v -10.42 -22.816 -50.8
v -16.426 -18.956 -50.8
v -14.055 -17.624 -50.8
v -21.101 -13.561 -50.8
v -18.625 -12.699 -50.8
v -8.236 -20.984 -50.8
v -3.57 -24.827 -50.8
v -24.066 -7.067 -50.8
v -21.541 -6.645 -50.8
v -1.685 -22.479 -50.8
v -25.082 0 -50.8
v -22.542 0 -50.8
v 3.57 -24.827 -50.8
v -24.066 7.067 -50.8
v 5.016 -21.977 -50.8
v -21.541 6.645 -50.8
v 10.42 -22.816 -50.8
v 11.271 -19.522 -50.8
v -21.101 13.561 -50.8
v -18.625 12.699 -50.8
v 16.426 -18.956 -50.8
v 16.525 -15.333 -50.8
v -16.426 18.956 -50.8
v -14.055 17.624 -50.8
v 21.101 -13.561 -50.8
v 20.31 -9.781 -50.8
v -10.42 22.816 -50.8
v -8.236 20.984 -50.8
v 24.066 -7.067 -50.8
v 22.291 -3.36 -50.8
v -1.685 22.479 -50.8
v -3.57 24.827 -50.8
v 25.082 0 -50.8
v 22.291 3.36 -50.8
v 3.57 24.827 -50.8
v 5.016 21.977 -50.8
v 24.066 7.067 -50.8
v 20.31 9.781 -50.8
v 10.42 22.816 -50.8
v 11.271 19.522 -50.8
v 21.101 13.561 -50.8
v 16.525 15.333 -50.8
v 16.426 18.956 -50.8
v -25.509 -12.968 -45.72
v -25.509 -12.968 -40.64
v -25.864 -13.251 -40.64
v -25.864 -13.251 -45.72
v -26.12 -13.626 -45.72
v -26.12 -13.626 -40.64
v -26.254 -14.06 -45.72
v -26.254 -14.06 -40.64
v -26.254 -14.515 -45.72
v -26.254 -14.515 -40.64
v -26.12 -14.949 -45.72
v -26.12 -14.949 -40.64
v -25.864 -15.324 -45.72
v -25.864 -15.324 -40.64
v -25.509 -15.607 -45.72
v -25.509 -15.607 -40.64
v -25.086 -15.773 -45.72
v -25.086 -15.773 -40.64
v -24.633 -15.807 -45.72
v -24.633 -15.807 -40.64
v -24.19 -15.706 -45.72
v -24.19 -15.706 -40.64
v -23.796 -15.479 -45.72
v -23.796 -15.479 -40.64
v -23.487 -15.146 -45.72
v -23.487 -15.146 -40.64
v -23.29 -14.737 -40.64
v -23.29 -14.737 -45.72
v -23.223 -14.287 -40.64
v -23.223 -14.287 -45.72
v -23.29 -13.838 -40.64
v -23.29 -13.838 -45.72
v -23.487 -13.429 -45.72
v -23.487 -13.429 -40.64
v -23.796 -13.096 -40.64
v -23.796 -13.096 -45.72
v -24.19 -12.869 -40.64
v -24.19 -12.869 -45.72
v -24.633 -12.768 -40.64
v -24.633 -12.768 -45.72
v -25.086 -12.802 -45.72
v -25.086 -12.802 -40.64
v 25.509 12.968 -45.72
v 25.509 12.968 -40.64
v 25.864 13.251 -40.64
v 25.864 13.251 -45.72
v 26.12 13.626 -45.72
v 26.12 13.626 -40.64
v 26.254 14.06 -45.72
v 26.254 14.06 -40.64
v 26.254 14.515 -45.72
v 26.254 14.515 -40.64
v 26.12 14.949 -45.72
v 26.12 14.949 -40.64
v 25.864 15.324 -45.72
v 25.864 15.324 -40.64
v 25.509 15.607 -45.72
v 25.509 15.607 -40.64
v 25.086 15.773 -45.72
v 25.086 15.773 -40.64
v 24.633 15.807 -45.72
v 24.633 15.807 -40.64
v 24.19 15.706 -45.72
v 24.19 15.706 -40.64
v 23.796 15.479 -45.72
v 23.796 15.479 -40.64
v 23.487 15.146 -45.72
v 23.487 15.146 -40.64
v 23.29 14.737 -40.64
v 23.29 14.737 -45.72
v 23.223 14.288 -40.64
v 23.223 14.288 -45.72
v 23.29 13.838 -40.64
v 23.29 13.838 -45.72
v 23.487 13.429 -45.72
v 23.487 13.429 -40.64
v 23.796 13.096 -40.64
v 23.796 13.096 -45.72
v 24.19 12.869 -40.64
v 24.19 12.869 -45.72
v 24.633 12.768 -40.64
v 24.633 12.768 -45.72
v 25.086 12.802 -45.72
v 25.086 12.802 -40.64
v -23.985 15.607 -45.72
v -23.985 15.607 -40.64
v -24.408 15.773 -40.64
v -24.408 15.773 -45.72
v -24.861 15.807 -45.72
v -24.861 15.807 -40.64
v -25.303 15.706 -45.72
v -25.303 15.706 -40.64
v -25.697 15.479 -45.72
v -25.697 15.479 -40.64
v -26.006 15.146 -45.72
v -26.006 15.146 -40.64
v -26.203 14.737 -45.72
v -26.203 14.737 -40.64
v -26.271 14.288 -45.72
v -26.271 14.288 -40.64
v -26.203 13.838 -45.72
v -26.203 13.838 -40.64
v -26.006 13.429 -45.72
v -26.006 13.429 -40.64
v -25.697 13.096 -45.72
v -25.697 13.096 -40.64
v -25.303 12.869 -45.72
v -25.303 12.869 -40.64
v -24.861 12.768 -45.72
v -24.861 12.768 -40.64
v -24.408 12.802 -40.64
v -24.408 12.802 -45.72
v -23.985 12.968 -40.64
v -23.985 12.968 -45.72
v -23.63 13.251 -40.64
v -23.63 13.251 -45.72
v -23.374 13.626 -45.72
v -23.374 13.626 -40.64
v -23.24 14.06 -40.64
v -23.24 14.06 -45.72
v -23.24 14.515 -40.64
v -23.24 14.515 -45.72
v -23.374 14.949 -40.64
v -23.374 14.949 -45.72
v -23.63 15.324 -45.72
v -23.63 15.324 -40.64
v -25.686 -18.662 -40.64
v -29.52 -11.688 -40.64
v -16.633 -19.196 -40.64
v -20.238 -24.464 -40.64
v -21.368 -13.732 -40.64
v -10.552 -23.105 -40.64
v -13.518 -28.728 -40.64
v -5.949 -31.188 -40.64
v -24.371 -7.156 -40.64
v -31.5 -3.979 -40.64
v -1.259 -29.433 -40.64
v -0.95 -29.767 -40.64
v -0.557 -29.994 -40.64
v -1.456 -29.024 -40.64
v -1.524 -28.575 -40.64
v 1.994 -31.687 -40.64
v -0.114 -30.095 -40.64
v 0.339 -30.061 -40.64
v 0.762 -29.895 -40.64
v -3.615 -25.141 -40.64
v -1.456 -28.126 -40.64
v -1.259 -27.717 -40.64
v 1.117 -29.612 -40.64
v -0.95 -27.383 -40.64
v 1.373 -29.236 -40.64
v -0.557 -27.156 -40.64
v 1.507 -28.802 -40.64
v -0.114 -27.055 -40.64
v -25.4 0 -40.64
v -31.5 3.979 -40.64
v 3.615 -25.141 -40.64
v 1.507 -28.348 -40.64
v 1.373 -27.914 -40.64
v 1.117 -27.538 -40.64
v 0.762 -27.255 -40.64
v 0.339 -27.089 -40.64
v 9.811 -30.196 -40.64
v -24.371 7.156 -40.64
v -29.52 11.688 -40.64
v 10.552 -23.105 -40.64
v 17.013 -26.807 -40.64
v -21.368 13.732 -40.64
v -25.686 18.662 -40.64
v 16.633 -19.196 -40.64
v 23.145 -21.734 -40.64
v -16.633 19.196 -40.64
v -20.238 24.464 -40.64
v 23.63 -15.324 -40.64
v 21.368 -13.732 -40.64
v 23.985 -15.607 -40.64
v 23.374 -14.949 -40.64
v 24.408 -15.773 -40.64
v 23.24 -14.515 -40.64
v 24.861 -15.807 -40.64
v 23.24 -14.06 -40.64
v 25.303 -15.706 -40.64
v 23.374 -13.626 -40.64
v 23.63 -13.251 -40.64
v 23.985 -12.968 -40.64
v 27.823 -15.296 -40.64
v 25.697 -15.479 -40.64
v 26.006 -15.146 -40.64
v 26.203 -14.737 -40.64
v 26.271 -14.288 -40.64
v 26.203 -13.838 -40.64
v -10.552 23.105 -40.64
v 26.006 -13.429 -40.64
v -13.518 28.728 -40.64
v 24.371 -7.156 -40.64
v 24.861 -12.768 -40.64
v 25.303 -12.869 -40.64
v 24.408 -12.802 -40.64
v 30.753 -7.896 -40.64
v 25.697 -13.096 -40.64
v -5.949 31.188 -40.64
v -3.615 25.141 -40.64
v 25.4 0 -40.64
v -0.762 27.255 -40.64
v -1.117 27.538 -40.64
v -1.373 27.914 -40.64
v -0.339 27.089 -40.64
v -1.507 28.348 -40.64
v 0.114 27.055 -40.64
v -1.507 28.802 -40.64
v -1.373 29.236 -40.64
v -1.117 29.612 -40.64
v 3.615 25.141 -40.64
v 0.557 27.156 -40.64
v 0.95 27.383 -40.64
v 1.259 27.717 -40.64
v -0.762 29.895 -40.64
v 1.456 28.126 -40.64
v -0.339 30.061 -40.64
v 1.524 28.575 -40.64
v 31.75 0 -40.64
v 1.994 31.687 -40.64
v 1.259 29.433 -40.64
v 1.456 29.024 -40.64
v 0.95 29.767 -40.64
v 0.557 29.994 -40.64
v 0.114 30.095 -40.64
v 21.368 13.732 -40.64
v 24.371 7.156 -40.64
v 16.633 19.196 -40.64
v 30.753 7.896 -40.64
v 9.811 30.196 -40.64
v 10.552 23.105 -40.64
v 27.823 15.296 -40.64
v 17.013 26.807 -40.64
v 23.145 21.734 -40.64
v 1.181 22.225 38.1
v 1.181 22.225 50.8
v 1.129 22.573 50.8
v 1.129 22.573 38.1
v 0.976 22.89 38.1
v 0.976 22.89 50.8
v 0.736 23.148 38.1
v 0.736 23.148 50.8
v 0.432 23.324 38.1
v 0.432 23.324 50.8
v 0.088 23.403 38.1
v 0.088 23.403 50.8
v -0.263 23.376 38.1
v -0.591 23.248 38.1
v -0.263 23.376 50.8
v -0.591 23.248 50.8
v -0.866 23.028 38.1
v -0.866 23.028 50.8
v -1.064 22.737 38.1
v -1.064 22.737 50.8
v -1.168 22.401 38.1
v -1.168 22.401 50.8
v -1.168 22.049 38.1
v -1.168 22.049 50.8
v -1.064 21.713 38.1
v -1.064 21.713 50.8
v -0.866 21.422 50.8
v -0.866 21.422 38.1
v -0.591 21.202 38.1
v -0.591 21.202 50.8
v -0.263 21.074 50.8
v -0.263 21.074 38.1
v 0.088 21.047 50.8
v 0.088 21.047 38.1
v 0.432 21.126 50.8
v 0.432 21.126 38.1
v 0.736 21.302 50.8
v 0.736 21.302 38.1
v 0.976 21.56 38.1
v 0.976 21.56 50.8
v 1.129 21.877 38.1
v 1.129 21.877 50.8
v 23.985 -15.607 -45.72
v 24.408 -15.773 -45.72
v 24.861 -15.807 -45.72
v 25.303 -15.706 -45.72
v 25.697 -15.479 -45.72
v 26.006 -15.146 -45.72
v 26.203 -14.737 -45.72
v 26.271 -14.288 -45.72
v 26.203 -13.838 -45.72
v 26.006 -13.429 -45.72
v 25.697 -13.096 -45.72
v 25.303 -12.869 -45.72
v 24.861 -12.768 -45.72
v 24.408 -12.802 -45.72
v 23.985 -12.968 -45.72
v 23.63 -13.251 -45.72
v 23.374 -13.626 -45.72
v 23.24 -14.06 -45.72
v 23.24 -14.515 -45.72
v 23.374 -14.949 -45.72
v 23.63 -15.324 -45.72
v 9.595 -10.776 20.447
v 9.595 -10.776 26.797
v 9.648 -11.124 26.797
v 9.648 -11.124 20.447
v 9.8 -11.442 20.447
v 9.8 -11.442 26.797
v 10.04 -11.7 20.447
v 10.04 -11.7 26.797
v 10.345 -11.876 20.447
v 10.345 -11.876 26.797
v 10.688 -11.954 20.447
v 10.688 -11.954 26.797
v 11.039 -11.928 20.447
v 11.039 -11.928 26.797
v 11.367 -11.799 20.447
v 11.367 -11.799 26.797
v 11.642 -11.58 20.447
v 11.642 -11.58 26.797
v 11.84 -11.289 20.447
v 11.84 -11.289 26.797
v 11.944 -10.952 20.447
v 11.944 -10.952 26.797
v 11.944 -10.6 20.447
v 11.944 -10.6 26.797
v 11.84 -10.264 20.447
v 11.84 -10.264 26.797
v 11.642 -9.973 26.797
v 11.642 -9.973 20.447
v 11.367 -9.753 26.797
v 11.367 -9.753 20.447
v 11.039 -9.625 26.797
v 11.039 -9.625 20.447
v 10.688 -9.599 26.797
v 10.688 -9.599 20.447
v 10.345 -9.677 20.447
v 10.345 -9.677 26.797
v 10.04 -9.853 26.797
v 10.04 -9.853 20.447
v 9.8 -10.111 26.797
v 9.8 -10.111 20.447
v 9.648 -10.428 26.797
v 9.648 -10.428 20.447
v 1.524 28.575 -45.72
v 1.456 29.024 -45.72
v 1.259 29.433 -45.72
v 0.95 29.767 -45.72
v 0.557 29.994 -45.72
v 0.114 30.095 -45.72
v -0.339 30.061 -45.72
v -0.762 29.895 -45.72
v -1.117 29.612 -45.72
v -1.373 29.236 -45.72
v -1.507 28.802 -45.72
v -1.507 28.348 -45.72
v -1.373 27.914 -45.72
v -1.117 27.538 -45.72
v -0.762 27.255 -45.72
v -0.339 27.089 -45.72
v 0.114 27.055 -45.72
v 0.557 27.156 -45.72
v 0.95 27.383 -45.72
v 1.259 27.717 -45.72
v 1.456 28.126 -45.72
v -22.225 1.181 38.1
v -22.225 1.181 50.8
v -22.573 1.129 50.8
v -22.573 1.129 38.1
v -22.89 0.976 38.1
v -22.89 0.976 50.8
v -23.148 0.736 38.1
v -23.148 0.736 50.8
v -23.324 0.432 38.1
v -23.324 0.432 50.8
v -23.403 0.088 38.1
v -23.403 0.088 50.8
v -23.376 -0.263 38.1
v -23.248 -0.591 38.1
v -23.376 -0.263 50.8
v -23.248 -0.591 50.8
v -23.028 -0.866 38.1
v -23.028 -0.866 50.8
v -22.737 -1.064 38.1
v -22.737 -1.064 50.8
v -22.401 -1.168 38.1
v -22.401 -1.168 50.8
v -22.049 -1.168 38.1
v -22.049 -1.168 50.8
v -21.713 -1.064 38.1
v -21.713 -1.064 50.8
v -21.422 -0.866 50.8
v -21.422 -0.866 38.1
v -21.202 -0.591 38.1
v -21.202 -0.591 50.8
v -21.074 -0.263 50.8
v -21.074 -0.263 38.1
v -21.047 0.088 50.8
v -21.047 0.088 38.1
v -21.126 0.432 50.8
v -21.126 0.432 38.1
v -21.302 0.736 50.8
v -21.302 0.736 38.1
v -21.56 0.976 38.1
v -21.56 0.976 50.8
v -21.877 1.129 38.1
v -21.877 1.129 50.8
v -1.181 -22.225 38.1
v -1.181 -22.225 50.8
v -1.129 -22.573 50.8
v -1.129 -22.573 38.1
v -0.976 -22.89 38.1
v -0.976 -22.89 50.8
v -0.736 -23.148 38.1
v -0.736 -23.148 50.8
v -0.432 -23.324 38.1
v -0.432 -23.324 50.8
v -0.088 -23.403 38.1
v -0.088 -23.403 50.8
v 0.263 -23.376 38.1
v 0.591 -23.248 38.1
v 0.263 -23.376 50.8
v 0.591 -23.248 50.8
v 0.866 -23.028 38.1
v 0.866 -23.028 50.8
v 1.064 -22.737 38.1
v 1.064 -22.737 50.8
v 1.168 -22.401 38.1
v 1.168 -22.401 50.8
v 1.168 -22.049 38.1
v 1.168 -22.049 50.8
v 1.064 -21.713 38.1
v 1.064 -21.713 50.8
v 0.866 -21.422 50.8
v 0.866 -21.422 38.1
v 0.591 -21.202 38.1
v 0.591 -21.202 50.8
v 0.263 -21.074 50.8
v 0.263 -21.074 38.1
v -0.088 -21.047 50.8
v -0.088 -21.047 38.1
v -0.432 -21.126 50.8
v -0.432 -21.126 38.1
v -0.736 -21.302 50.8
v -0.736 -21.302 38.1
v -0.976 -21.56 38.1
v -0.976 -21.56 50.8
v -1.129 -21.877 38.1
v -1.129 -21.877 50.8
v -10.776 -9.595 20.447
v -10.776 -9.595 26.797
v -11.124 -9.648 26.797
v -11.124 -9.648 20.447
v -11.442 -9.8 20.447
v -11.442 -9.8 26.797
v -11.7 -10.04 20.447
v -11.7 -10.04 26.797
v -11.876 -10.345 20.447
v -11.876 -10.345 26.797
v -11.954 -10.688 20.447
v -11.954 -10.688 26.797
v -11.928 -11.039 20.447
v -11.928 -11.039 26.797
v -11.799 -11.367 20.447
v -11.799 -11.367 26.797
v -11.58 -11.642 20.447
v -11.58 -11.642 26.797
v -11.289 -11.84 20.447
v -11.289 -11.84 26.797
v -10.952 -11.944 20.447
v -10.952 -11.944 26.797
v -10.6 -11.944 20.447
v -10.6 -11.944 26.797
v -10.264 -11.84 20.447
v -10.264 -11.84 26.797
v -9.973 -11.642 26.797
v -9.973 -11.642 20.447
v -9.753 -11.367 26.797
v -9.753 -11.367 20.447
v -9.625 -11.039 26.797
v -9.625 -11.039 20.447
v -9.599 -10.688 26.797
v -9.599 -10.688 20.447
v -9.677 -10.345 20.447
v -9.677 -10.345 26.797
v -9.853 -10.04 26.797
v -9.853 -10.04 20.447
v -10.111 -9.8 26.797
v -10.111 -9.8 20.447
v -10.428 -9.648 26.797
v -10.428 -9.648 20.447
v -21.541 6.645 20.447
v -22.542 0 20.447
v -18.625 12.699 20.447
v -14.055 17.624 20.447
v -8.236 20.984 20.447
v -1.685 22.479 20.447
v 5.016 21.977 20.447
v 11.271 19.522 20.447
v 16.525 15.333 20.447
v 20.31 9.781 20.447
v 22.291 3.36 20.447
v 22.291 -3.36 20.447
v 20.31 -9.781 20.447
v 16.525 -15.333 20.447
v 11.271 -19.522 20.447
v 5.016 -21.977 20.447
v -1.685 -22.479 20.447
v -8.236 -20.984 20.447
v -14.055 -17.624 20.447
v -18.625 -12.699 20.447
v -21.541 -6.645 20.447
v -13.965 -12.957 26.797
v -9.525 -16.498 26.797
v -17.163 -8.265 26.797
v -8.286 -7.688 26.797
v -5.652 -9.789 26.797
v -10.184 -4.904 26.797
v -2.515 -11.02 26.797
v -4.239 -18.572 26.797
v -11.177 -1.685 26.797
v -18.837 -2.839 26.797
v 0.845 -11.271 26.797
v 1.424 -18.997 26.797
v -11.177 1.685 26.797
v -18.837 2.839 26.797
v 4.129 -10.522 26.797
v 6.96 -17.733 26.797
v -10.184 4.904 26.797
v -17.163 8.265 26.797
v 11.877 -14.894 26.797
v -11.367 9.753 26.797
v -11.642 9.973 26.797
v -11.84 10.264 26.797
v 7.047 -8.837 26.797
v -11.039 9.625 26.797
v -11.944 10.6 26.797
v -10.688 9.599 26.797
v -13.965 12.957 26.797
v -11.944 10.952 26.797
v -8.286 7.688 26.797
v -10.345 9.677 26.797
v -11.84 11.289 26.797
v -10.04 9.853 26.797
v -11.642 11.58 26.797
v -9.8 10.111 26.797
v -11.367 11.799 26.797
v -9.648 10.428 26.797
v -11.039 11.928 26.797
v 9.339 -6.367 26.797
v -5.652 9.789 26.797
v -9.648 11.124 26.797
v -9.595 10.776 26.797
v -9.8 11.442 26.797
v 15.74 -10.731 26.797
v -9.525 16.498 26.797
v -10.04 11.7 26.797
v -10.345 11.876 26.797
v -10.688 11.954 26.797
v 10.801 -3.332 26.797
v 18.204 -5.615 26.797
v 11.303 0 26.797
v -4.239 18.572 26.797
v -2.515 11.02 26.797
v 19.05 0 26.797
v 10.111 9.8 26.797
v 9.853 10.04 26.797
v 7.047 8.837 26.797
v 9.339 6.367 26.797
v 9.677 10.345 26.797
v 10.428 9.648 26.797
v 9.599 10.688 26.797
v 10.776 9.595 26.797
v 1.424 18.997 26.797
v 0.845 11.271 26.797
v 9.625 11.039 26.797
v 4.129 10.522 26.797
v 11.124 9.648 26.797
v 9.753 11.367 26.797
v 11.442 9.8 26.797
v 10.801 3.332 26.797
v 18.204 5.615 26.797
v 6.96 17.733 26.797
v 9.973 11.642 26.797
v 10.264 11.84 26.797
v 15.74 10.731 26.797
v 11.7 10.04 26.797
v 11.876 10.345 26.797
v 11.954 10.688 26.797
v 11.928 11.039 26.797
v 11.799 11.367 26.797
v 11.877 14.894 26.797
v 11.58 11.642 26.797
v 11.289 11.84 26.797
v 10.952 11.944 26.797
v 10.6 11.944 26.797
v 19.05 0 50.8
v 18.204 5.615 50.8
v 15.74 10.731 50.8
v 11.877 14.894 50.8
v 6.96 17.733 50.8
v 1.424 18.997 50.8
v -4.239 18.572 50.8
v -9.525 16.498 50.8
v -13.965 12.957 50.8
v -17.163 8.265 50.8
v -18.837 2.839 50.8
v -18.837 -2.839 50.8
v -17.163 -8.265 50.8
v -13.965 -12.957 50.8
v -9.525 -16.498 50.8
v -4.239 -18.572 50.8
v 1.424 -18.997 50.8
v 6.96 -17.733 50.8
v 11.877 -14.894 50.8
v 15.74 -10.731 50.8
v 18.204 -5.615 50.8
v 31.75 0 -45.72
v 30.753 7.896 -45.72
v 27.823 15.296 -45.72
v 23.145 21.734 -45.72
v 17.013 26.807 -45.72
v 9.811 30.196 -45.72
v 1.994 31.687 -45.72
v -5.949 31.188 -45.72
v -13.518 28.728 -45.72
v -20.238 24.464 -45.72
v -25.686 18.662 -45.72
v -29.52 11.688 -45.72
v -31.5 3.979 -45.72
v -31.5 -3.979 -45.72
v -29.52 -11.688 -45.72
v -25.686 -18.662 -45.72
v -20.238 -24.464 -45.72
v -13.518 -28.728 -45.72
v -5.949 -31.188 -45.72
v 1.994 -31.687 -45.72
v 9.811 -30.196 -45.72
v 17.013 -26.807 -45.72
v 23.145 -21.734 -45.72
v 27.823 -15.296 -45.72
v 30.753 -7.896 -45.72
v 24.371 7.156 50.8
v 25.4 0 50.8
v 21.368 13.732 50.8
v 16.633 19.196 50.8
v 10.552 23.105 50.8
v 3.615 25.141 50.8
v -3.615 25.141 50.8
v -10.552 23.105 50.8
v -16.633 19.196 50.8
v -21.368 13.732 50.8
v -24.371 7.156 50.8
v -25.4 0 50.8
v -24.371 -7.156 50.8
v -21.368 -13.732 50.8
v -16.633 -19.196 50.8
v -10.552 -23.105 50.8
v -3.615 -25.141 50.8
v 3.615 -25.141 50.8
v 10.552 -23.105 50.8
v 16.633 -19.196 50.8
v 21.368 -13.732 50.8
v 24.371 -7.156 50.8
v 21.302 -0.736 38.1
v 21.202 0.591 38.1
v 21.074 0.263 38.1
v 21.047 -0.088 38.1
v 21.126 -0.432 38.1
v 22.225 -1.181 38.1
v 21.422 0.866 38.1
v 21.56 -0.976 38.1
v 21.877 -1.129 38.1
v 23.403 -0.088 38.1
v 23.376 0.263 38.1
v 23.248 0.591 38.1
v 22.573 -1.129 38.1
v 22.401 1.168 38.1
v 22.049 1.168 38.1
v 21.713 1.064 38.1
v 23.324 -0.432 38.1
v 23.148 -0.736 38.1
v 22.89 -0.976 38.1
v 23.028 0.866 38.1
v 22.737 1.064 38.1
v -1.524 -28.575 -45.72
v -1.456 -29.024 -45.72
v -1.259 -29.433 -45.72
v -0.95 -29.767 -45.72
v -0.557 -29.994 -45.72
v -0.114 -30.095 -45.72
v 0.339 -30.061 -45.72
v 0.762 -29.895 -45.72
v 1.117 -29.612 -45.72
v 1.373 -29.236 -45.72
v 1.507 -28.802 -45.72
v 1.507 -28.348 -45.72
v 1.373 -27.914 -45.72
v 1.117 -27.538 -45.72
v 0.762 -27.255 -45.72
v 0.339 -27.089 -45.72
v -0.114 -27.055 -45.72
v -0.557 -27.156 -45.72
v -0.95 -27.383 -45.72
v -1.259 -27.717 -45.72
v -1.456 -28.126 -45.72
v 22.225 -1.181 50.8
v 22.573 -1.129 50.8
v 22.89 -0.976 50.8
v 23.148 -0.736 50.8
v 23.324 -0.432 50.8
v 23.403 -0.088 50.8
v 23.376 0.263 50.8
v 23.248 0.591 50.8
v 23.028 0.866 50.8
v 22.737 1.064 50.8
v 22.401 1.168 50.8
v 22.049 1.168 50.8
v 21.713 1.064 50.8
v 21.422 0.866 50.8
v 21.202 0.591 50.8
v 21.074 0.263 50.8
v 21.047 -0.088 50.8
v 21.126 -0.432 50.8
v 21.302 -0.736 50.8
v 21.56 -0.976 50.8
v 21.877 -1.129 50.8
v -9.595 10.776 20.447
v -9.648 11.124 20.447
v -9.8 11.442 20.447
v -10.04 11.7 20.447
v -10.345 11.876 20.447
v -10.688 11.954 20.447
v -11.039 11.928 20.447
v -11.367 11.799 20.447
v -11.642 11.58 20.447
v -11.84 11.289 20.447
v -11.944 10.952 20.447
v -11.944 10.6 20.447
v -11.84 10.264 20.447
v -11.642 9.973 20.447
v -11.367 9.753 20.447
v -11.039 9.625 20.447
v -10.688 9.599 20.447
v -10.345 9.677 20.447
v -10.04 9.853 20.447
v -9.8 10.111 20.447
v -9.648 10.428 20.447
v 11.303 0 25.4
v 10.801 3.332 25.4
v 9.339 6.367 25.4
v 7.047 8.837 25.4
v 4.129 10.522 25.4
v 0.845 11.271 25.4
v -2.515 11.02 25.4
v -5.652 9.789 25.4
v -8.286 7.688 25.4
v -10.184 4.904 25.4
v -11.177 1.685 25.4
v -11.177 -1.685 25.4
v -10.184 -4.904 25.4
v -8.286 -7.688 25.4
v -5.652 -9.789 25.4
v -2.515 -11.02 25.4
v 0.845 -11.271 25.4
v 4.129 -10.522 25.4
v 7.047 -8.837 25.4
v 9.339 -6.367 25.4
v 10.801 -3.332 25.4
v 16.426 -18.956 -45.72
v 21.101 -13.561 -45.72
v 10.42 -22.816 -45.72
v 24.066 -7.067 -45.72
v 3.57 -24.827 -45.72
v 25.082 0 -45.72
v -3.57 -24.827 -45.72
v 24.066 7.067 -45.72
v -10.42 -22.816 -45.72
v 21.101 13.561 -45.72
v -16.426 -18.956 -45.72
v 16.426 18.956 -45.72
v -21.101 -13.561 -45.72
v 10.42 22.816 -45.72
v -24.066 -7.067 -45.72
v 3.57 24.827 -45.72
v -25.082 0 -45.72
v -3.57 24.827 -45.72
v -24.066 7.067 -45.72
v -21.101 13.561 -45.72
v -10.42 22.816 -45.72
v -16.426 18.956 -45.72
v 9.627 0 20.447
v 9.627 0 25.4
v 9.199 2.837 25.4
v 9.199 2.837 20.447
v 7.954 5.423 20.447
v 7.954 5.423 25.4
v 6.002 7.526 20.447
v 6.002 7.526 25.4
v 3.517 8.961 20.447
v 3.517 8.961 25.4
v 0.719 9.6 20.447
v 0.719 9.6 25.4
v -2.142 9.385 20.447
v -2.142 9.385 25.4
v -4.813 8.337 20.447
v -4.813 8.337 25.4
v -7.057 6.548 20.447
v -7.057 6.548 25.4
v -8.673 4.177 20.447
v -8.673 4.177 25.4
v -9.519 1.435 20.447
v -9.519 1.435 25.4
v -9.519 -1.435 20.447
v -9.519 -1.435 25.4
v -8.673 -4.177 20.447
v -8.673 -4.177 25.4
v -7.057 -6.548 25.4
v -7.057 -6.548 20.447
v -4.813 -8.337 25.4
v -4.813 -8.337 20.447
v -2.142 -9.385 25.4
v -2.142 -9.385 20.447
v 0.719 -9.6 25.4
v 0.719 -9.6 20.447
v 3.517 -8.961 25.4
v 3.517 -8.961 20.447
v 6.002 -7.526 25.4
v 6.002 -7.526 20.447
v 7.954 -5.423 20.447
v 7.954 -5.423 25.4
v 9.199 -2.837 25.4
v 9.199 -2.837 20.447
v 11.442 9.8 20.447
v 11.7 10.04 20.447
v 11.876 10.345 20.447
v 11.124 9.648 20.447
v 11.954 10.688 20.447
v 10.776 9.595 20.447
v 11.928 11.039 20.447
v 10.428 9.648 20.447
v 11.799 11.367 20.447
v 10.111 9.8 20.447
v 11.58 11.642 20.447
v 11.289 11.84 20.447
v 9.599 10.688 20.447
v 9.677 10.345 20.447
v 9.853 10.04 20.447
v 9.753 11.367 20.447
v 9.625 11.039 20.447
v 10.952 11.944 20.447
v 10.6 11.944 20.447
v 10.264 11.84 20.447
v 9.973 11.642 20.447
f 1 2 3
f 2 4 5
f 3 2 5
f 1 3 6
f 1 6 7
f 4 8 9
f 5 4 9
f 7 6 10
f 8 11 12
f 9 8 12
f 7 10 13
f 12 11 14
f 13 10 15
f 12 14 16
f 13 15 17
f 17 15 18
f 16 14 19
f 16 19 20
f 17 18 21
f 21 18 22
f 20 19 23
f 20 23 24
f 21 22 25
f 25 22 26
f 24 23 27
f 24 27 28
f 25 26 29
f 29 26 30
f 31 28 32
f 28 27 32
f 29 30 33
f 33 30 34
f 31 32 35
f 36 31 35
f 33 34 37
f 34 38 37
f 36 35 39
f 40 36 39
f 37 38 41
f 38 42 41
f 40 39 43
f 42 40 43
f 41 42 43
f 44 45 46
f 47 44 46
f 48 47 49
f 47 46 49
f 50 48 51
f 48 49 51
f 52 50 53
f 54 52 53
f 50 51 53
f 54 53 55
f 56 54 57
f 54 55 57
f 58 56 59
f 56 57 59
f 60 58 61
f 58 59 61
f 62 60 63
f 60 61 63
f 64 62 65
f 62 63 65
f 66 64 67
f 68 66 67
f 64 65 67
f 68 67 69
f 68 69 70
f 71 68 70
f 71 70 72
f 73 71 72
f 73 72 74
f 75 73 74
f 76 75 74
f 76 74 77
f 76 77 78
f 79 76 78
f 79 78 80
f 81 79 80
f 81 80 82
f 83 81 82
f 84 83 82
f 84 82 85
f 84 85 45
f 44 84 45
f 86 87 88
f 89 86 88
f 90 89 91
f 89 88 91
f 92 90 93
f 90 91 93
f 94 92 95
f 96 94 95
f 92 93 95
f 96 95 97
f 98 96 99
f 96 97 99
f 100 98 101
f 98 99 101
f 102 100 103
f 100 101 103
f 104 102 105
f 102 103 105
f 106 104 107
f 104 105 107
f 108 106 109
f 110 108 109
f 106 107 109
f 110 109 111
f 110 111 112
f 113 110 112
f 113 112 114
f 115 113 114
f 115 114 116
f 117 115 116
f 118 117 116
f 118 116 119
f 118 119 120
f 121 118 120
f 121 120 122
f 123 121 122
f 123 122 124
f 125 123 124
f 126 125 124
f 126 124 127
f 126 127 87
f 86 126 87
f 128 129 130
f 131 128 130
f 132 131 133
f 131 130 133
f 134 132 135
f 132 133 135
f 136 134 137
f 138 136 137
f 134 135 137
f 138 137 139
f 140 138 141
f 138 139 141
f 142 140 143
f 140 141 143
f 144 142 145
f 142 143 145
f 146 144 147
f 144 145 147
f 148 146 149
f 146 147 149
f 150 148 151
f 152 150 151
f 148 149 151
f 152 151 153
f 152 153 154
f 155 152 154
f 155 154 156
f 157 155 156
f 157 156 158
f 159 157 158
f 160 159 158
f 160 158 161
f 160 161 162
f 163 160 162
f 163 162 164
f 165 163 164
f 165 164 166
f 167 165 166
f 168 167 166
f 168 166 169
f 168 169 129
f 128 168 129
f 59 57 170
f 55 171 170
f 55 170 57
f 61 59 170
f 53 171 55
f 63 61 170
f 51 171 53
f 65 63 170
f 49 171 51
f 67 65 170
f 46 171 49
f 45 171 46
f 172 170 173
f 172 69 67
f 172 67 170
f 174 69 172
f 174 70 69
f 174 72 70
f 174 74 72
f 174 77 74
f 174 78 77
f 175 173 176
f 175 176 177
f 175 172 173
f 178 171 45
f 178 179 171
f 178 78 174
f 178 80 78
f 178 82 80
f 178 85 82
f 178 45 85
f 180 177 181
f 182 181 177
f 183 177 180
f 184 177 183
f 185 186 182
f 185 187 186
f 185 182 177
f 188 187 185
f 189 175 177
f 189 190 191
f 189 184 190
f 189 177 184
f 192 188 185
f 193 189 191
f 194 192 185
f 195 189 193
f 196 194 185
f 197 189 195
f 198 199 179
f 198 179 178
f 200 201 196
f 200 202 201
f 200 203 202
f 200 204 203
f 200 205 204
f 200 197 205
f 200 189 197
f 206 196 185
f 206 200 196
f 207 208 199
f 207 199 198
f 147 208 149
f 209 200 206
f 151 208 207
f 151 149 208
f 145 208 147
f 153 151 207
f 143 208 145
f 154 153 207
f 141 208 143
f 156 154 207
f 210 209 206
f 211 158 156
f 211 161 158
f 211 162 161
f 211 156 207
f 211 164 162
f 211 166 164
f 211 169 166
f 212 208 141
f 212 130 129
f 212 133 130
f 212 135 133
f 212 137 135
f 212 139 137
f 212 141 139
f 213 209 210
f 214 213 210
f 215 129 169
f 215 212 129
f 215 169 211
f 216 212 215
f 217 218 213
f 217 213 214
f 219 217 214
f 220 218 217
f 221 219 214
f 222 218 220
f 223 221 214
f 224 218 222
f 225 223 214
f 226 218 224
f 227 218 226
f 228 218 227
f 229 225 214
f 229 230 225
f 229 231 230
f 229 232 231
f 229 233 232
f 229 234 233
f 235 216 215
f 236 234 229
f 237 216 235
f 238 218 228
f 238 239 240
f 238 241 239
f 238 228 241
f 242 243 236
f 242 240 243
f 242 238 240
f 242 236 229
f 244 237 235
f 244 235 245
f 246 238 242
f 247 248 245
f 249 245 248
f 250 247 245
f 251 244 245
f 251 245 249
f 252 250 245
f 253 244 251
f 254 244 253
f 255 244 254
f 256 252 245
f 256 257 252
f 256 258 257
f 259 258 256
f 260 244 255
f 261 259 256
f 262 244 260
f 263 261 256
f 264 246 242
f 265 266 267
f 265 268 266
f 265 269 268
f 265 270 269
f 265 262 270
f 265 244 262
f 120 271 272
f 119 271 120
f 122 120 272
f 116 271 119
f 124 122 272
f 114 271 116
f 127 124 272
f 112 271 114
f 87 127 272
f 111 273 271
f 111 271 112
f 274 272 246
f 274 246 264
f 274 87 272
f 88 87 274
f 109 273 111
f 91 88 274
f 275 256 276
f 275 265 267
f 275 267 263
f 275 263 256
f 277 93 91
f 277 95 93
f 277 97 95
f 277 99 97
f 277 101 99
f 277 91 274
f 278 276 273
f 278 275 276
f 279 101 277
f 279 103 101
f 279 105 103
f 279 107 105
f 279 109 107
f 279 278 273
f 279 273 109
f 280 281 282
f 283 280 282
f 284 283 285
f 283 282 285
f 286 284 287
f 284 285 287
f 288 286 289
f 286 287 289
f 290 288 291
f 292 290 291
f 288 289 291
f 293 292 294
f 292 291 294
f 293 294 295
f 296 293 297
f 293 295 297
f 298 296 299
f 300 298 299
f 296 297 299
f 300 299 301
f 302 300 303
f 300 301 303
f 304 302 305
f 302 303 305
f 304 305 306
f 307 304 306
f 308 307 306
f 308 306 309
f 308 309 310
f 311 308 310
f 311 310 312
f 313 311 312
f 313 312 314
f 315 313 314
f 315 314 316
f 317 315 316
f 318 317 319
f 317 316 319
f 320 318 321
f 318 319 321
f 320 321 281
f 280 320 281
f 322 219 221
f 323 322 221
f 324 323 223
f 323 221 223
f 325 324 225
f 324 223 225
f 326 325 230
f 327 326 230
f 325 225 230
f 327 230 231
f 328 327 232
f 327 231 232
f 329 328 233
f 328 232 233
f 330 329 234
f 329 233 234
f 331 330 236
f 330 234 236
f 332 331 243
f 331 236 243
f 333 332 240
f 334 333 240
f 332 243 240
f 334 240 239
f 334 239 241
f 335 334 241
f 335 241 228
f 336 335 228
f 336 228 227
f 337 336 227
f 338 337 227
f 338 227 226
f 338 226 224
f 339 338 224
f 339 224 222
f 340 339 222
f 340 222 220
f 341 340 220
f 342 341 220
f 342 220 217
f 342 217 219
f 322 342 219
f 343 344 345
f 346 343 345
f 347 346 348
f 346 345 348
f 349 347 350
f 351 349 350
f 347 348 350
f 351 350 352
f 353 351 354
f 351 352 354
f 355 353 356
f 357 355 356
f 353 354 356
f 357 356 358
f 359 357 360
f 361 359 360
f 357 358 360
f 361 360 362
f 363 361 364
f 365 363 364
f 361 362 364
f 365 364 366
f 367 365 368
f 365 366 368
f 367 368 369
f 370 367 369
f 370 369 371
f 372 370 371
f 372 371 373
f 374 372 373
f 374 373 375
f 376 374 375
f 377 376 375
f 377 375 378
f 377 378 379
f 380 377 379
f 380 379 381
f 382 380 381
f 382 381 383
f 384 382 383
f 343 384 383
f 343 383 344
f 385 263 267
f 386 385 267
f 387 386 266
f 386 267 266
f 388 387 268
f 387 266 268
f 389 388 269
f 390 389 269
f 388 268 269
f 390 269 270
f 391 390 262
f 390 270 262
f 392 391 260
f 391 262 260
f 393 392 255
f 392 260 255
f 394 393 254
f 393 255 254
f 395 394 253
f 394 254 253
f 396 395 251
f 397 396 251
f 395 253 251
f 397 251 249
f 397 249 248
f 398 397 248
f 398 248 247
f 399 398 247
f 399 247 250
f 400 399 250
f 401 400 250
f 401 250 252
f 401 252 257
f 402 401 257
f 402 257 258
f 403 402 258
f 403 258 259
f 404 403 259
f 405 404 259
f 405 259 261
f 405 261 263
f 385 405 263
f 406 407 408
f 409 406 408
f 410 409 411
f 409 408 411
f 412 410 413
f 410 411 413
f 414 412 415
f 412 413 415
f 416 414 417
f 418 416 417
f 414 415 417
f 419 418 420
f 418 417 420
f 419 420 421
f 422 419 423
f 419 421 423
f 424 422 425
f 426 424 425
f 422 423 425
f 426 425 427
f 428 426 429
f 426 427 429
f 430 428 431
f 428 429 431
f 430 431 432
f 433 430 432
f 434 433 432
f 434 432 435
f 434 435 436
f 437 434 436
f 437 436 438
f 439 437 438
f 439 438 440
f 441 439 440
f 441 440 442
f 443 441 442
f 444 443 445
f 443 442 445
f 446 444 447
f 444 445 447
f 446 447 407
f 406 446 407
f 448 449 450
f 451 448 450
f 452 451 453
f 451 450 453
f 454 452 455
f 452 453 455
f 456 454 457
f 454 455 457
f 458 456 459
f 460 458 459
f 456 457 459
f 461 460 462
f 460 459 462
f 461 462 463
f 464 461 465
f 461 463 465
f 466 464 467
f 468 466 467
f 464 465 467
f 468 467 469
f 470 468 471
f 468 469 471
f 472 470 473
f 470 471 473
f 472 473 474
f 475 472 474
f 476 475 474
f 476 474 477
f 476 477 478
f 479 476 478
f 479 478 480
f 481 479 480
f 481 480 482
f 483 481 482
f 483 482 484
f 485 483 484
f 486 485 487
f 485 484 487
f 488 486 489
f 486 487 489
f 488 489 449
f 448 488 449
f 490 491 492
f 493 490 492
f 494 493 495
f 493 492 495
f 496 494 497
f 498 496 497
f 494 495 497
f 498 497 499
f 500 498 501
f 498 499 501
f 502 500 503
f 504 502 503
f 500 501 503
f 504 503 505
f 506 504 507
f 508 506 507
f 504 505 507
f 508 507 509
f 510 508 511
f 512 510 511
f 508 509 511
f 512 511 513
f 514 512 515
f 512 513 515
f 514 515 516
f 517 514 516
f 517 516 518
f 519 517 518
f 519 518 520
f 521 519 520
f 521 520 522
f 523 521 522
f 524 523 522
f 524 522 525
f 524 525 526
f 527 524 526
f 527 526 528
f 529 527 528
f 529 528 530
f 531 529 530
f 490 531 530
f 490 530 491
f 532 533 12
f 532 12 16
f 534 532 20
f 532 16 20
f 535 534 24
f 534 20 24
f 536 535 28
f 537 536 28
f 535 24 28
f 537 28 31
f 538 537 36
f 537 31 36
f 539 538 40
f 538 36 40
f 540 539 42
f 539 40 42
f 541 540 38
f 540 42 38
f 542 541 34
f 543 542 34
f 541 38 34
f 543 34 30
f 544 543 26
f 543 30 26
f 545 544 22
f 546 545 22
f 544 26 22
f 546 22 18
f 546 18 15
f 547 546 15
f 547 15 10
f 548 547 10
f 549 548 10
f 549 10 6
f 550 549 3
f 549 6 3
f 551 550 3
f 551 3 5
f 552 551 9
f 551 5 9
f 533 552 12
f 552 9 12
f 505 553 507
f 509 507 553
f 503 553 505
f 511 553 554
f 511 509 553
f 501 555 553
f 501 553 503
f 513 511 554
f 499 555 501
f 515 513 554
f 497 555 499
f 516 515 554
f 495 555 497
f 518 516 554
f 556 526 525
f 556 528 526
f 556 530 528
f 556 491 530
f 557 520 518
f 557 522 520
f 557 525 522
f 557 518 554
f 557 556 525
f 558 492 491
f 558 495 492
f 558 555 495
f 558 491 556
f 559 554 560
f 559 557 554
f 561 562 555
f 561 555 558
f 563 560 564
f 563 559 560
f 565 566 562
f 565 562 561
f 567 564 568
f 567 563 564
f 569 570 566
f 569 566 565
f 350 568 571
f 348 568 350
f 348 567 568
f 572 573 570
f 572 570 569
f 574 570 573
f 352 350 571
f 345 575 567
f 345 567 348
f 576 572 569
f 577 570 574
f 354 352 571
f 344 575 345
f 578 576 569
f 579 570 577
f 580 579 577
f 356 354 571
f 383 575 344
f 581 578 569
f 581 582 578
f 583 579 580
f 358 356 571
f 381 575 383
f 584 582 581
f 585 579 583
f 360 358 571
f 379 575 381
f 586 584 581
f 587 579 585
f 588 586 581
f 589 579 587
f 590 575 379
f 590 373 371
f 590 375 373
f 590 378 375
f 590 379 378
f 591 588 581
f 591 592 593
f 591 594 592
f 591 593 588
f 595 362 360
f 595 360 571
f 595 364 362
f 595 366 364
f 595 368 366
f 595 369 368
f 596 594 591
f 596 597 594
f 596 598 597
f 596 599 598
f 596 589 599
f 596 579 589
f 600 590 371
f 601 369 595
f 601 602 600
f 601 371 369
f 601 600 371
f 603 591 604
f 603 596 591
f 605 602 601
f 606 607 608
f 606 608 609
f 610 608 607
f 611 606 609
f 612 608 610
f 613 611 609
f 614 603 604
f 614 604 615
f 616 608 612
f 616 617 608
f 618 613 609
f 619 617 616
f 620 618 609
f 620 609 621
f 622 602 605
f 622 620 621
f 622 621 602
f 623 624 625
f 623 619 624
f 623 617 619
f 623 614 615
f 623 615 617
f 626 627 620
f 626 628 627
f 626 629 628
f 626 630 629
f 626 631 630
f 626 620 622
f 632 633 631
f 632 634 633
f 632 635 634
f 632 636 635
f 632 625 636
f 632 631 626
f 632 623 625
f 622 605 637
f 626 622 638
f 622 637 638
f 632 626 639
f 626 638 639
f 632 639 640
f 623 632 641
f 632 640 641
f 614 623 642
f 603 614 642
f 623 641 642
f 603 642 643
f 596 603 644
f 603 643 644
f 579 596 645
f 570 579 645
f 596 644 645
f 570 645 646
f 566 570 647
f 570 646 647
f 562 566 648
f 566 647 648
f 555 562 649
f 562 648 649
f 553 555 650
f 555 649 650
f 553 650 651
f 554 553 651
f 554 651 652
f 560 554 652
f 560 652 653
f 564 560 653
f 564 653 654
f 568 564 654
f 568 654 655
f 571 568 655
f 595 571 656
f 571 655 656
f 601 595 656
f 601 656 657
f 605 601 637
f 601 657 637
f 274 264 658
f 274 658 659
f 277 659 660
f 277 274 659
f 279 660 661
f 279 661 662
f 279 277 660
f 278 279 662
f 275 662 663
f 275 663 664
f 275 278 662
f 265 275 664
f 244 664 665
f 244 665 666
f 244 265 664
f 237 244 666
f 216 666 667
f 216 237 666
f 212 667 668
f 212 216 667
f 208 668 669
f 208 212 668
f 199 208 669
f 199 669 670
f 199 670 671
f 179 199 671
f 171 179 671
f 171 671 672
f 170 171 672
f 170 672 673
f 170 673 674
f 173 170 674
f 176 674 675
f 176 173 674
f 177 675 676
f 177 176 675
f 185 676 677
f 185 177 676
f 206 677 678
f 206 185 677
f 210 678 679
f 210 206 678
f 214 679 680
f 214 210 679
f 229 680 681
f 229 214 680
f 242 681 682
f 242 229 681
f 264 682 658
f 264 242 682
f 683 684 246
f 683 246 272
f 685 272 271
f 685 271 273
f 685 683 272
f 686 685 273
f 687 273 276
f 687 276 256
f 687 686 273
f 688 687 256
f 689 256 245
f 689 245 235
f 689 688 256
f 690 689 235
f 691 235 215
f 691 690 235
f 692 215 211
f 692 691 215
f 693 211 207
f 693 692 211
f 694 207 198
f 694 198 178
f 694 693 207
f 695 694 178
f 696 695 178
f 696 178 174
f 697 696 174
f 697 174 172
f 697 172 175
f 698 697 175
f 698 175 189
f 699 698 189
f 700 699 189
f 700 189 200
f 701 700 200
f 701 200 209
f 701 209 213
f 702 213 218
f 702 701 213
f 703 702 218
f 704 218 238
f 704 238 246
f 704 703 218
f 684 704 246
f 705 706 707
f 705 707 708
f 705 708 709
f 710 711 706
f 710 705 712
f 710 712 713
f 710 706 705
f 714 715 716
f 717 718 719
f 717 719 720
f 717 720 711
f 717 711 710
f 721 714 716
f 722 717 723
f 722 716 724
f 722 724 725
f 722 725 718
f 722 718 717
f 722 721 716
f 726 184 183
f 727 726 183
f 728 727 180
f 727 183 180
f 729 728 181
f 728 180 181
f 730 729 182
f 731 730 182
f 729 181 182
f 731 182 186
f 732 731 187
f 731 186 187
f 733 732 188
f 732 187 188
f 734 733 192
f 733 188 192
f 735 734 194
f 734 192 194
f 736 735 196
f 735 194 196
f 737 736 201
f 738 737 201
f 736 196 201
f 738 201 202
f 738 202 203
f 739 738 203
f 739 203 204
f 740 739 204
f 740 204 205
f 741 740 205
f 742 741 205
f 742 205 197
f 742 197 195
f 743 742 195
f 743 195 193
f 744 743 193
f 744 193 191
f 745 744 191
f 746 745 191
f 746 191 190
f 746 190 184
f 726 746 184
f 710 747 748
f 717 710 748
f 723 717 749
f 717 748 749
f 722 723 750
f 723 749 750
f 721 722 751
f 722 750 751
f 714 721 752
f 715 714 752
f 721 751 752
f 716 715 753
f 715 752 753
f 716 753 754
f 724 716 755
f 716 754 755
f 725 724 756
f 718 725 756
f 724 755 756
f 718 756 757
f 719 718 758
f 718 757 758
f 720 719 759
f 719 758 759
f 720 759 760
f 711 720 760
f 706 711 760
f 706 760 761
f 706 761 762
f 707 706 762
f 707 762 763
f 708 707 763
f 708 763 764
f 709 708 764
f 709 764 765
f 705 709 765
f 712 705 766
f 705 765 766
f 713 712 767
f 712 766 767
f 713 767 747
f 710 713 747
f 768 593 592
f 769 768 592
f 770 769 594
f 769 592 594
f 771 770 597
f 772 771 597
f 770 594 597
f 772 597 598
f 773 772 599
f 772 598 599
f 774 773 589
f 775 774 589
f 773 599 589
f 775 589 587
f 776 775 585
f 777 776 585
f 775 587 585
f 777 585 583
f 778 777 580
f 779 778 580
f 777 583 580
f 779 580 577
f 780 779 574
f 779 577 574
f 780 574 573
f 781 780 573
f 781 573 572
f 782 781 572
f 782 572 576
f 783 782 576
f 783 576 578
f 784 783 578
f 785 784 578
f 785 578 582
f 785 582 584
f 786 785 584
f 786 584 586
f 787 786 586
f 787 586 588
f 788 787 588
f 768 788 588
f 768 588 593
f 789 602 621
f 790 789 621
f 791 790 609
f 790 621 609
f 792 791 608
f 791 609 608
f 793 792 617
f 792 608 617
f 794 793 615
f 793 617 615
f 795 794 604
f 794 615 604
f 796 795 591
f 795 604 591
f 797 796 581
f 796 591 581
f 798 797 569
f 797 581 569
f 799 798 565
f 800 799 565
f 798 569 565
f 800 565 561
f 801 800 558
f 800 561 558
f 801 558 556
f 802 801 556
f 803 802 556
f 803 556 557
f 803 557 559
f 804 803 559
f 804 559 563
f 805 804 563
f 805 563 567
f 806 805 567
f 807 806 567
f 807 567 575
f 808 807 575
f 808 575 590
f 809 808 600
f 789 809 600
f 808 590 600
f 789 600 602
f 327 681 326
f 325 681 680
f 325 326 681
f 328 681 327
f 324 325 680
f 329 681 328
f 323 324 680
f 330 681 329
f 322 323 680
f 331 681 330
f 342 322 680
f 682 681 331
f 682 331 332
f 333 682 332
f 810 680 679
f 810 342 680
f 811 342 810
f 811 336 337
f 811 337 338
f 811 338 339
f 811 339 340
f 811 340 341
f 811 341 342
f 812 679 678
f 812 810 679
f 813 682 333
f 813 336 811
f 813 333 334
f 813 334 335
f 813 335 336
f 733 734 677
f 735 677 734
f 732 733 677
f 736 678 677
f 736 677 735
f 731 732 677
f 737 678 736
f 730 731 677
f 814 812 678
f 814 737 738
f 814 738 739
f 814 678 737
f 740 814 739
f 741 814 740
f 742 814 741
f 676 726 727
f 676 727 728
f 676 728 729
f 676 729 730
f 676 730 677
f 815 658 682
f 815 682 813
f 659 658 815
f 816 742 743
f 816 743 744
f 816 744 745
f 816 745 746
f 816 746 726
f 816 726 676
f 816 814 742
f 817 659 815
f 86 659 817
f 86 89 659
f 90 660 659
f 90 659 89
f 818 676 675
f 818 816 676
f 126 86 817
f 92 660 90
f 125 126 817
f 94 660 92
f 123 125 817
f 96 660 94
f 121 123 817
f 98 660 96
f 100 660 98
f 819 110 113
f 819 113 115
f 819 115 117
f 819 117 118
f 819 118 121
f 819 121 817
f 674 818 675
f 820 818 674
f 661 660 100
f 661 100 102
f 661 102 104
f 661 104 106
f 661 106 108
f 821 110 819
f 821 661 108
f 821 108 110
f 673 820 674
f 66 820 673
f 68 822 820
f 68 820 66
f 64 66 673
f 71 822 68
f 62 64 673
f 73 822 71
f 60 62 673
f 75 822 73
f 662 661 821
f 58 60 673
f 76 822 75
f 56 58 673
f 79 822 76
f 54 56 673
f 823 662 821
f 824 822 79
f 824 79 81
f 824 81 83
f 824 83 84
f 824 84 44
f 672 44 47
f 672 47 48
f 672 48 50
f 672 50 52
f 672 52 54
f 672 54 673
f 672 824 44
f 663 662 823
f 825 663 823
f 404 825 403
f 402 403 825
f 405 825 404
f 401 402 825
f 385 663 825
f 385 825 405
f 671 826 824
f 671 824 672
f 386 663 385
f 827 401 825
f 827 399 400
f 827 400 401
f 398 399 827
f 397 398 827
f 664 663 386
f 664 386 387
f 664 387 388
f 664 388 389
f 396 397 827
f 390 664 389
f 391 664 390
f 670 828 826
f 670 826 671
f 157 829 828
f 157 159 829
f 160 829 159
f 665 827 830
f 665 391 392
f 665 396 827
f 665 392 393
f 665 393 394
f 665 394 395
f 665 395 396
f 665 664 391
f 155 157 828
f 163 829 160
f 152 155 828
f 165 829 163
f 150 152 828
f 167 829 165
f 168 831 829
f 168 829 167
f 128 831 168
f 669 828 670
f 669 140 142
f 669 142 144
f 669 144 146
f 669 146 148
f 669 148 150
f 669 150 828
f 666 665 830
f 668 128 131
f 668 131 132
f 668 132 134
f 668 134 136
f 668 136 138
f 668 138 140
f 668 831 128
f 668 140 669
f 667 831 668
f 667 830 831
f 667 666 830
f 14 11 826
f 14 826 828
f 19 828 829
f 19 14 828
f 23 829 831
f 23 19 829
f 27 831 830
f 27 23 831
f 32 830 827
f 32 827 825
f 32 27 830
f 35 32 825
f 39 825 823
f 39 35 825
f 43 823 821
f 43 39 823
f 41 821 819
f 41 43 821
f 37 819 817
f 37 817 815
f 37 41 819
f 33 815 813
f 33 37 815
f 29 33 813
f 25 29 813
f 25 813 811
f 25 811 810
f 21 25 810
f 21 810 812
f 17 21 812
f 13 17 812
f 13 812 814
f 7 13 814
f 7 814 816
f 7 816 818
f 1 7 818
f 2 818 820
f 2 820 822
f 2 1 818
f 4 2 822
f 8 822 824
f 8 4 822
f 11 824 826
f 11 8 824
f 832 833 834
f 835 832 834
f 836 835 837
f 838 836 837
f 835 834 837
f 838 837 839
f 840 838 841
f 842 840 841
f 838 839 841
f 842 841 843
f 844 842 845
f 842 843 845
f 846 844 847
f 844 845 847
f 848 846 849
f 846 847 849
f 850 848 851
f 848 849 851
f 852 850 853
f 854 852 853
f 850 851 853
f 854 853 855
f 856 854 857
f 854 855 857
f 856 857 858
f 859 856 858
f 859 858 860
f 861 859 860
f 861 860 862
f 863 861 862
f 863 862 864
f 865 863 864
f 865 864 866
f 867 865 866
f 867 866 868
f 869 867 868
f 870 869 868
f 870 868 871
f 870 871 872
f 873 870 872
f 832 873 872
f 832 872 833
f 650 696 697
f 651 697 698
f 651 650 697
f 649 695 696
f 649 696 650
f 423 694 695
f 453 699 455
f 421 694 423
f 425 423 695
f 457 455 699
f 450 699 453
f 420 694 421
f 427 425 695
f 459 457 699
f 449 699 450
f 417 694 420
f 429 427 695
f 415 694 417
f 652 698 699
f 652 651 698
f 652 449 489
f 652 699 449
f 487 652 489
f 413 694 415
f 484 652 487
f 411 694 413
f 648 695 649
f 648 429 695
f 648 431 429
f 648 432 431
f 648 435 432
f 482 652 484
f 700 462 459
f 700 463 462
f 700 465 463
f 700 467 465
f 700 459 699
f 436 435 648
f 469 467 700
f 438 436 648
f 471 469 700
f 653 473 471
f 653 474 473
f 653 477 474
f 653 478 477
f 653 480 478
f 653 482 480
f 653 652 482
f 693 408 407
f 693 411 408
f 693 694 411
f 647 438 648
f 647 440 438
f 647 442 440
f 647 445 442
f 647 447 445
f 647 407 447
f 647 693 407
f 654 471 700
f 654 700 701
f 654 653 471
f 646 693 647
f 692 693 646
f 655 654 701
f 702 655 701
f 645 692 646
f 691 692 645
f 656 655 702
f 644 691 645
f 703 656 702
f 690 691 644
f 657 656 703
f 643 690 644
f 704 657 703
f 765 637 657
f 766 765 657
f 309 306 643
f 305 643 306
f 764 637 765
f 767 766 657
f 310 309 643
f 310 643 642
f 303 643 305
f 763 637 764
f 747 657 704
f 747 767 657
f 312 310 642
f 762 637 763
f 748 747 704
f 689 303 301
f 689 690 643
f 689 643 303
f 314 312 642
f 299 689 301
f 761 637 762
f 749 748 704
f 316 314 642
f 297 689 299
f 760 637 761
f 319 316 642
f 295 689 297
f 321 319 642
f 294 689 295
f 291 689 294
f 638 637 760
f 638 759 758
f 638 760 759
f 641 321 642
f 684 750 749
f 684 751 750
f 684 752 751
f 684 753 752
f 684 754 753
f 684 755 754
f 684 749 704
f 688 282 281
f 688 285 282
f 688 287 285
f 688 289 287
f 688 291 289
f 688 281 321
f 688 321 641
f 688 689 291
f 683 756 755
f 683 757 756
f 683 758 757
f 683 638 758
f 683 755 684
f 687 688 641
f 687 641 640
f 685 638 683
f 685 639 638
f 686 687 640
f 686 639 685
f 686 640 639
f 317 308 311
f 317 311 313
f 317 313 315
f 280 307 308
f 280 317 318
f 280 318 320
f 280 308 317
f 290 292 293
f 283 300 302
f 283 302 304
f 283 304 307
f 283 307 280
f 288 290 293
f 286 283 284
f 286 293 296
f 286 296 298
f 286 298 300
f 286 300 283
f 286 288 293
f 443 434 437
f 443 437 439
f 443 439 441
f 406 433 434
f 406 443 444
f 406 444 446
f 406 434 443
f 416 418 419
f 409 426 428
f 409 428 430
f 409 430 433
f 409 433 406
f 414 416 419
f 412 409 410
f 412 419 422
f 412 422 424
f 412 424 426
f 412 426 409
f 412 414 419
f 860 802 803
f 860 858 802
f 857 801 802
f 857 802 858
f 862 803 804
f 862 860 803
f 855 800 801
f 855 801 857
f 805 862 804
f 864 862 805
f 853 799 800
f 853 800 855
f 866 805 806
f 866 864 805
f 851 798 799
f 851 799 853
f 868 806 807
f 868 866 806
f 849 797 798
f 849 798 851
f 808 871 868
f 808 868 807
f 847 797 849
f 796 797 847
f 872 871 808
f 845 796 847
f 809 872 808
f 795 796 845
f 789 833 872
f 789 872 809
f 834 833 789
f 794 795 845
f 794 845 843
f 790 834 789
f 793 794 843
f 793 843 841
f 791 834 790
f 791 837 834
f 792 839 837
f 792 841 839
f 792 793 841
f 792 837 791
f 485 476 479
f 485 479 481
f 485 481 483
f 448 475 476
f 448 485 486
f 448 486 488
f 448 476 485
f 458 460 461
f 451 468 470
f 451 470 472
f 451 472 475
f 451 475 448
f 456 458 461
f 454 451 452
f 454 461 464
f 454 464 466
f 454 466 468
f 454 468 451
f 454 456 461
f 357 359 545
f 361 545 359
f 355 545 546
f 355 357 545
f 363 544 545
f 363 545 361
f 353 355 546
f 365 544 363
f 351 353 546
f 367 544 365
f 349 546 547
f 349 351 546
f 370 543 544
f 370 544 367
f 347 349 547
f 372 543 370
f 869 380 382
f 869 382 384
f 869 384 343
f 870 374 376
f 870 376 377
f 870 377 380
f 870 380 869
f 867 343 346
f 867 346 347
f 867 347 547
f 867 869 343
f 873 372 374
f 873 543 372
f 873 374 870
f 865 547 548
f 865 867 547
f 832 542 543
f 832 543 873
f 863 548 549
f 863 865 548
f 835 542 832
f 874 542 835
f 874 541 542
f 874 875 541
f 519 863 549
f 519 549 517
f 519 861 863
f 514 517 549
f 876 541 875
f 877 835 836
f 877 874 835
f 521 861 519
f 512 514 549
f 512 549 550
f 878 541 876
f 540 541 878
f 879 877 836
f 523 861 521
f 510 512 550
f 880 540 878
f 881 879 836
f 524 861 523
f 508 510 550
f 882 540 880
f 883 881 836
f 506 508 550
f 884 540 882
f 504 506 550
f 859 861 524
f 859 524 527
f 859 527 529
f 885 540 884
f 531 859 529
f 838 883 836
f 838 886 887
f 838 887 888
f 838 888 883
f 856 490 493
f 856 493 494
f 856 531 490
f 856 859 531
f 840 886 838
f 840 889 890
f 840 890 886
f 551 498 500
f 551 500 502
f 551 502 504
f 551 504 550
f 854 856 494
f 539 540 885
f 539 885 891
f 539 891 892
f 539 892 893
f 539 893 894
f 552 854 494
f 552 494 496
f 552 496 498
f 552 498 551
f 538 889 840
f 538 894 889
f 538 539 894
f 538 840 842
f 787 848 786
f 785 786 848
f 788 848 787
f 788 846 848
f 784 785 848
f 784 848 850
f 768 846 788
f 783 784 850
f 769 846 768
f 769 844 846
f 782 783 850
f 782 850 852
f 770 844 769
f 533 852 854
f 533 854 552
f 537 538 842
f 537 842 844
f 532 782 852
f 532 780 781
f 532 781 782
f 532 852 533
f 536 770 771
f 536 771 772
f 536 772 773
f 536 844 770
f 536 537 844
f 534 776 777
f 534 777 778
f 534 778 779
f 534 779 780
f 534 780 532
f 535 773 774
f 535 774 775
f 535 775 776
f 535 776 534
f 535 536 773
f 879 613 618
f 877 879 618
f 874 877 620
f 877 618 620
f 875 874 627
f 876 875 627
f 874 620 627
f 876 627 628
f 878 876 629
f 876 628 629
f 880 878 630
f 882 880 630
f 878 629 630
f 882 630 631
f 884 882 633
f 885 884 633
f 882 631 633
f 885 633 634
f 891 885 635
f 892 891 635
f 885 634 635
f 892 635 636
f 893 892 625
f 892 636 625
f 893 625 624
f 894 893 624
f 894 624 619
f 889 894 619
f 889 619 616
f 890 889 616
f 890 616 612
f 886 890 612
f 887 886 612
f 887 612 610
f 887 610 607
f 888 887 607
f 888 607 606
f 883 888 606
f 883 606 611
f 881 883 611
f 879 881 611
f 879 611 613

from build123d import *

# Parameters (mm, degrees)
SKETCH1_R           = 31.75
BOSS_EXTRUDE1_DEPTH = 50.8
SKETCH2_R           = 31.75
SKETCH2_R_2         = 25.0825
CUT_EXTRUDE1_DEPTH  = 5.08
SKETCH3_R           = 22.5425
CUT_EXTRUDE2_DEPTH  = 71.247
SKETCH4_R           = 31.75
SKETCH4_R_2         = 25.4
CUT_EXTRUDE3_DEPTH  = 91.44
SKETCH5_R           = 19.05
CUT_EXTRUDE4_DEPTH  = 24.003
SKETCH6_R           = 9.6266
CUT_EXTRUDE5_DEPTH  = 78.597
SKETCH8_R           = 1.524
CUT_EXTRUDE6_DEPTH  = 11.16
CIRPATTERN1_COUNT   = 6
SKETCH9_R           = 1.1811
CUT_EXTRUDE7_DEPTH  = 12.7
CIRPATTERN2_COUNT   = 4
SKETCH10_R          = 11.303
CUT_EXTRUDE8_DEPTH  = 1.397
SKETCH11_R          = 1.1811
CUT_EXTRUDE9_DEPTH  = 78.597
CIRPATTERN3_COUNT   = 4


with BuildPart() as part:
    # Sketch1 → Boss-Extrude1 (new body, symmetric)
    with BuildSketch(Plane.XY):
        Circle(SKETCH1_R)
    extrude(amount=BOSS_EXTRUDE1_DEPTH, both=True)

    # Sketch2 → Cut-Extrude1 (cut)
    with BuildSketch(Plane(origin=(0, 0, -50.8), x_dir=(-1, 0, 0), z_dir=(0, 0, -1))):
        Circle(SKETCH2_R)
        Circle(SKETCH2_R_2, mode=Mode.SUBTRACT)
    extrude(amount=-CUT_EXTRUDE1_DEPTH, mode=Mode.SUBTRACT)

    # Sketch3 → Cut-Extrude2 (cut)
    with BuildSketch(Plane(origin=(0, 0, -50.8), x_dir=(-1, 0, 0), z_dir=(0, 0, -1))):
        Circle(SKETCH3_R)
    extrude(amount=-CUT_EXTRUDE2_DEPTH, mode=Mode.SUBTRACT)

    # Sketch4 → Cut-Extrude3 (cut)
    with BuildSketch(Plane.XY.offset(50.8)):
        Circle(SKETCH4_R)
        Circle(SKETCH4_R_2, mode=Mode.SUBTRACT)
    extrude(amount=-CUT_EXTRUDE3_DEPTH, mode=Mode.SUBTRACT)

    # Sketch5 → Cut-Extrude4 (cut)
    with BuildSketch(Plane.XY.offset(50.8)):
        Circle(SKETCH5_R)
    extrude(amount=-CUT_EXTRUDE4_DEPTH, mode=Mode.SUBTRACT)

    # Sketch6 → Cut-Extrude5 (cut, through all)
    with BuildSketch(Plane.XY.offset(26.797)):
        Circle(SKETCH6_R)
    extrude(amount=-CUT_EXTRUDE5_DEPTH, mode=Mode.SUBTRACT)

    # Sketch8 → Cut-Extrude6 (cut, through all)
    with BuildSketch(Plane.XY.offset(-40.64)):
        with Locations((0, 28.575)):
            Circle(SKETCH8_R)
    cut_extrude6 = extrude(amount=-CUT_EXTRUDE6_DEPTH, mode=Mode.SUBTRACT)

    # CirPattern1: Cut-Extrude6 ×6 about axis
    cirpattern1_axis = Axis((0, 0, 0), (0, 0, 1))
    for i in range(1, CIRPATTERN1_COUNT):
        add(cut_extrude6.rotate(cirpattern1_axis, i * 360 / CIRPATTERN1_COUNT), mode=Mode.SUBTRACT)

    # Sketch9 → Cut-Extrude7 (cut)
    with BuildSketch(Plane.XY.offset(50.8)):
        with Locations((0, 22.225)):
            Circle(SKETCH9_R)
    cut_extrude7 = extrude(amount=-CUT_EXTRUDE7_DEPTH, mode=Mode.SUBTRACT)

    # CirPattern2: Cut-Extrude7 ×4 about axis
    cirpattern2_axis = Axis((0, 0, 0), (0, 0, 1))
    for i in range(1, CIRPATTERN2_COUNT):
        add(cut_extrude7.rotate(cirpattern2_axis, i * 360 / CIRPATTERN2_COUNT), mode=Mode.SUBTRACT)

    # Sketch10 → Cut-Extrude8 (cut)
    with BuildSketch(Plane.XY.offset(26.797)):
        Circle(SKETCH10_R)
    extrude(amount=-CUT_EXTRUDE8_DEPTH, mode=Mode.SUBTRACT)

    # Sketch11 → Cut-Extrude9 (cut, through all)
    with BuildSketch(Plane.XY.offset(26.797)):
        with Locations((-10.776307345, 10.776307345)):
            Circle(SKETCH11_R)
    cut_extrude9 = extrude(amount=-CUT_EXTRUDE9_DEPTH, mode=Mode.SUBTRACT)

    # CirPattern3: Cut-Extrude9 ×4 about axis
    cirpattern3_axis = Axis((0, 0, 0), (0, 0, 1))
    for i in range(1, CIRPATTERN3_COUNT):
        add(cut_extrude9.rotate(cirpattern3_axis, i * 360 / CIRPATTERN3_COUNT), mode=Mode.SUBTRACT)


solid = part.part
